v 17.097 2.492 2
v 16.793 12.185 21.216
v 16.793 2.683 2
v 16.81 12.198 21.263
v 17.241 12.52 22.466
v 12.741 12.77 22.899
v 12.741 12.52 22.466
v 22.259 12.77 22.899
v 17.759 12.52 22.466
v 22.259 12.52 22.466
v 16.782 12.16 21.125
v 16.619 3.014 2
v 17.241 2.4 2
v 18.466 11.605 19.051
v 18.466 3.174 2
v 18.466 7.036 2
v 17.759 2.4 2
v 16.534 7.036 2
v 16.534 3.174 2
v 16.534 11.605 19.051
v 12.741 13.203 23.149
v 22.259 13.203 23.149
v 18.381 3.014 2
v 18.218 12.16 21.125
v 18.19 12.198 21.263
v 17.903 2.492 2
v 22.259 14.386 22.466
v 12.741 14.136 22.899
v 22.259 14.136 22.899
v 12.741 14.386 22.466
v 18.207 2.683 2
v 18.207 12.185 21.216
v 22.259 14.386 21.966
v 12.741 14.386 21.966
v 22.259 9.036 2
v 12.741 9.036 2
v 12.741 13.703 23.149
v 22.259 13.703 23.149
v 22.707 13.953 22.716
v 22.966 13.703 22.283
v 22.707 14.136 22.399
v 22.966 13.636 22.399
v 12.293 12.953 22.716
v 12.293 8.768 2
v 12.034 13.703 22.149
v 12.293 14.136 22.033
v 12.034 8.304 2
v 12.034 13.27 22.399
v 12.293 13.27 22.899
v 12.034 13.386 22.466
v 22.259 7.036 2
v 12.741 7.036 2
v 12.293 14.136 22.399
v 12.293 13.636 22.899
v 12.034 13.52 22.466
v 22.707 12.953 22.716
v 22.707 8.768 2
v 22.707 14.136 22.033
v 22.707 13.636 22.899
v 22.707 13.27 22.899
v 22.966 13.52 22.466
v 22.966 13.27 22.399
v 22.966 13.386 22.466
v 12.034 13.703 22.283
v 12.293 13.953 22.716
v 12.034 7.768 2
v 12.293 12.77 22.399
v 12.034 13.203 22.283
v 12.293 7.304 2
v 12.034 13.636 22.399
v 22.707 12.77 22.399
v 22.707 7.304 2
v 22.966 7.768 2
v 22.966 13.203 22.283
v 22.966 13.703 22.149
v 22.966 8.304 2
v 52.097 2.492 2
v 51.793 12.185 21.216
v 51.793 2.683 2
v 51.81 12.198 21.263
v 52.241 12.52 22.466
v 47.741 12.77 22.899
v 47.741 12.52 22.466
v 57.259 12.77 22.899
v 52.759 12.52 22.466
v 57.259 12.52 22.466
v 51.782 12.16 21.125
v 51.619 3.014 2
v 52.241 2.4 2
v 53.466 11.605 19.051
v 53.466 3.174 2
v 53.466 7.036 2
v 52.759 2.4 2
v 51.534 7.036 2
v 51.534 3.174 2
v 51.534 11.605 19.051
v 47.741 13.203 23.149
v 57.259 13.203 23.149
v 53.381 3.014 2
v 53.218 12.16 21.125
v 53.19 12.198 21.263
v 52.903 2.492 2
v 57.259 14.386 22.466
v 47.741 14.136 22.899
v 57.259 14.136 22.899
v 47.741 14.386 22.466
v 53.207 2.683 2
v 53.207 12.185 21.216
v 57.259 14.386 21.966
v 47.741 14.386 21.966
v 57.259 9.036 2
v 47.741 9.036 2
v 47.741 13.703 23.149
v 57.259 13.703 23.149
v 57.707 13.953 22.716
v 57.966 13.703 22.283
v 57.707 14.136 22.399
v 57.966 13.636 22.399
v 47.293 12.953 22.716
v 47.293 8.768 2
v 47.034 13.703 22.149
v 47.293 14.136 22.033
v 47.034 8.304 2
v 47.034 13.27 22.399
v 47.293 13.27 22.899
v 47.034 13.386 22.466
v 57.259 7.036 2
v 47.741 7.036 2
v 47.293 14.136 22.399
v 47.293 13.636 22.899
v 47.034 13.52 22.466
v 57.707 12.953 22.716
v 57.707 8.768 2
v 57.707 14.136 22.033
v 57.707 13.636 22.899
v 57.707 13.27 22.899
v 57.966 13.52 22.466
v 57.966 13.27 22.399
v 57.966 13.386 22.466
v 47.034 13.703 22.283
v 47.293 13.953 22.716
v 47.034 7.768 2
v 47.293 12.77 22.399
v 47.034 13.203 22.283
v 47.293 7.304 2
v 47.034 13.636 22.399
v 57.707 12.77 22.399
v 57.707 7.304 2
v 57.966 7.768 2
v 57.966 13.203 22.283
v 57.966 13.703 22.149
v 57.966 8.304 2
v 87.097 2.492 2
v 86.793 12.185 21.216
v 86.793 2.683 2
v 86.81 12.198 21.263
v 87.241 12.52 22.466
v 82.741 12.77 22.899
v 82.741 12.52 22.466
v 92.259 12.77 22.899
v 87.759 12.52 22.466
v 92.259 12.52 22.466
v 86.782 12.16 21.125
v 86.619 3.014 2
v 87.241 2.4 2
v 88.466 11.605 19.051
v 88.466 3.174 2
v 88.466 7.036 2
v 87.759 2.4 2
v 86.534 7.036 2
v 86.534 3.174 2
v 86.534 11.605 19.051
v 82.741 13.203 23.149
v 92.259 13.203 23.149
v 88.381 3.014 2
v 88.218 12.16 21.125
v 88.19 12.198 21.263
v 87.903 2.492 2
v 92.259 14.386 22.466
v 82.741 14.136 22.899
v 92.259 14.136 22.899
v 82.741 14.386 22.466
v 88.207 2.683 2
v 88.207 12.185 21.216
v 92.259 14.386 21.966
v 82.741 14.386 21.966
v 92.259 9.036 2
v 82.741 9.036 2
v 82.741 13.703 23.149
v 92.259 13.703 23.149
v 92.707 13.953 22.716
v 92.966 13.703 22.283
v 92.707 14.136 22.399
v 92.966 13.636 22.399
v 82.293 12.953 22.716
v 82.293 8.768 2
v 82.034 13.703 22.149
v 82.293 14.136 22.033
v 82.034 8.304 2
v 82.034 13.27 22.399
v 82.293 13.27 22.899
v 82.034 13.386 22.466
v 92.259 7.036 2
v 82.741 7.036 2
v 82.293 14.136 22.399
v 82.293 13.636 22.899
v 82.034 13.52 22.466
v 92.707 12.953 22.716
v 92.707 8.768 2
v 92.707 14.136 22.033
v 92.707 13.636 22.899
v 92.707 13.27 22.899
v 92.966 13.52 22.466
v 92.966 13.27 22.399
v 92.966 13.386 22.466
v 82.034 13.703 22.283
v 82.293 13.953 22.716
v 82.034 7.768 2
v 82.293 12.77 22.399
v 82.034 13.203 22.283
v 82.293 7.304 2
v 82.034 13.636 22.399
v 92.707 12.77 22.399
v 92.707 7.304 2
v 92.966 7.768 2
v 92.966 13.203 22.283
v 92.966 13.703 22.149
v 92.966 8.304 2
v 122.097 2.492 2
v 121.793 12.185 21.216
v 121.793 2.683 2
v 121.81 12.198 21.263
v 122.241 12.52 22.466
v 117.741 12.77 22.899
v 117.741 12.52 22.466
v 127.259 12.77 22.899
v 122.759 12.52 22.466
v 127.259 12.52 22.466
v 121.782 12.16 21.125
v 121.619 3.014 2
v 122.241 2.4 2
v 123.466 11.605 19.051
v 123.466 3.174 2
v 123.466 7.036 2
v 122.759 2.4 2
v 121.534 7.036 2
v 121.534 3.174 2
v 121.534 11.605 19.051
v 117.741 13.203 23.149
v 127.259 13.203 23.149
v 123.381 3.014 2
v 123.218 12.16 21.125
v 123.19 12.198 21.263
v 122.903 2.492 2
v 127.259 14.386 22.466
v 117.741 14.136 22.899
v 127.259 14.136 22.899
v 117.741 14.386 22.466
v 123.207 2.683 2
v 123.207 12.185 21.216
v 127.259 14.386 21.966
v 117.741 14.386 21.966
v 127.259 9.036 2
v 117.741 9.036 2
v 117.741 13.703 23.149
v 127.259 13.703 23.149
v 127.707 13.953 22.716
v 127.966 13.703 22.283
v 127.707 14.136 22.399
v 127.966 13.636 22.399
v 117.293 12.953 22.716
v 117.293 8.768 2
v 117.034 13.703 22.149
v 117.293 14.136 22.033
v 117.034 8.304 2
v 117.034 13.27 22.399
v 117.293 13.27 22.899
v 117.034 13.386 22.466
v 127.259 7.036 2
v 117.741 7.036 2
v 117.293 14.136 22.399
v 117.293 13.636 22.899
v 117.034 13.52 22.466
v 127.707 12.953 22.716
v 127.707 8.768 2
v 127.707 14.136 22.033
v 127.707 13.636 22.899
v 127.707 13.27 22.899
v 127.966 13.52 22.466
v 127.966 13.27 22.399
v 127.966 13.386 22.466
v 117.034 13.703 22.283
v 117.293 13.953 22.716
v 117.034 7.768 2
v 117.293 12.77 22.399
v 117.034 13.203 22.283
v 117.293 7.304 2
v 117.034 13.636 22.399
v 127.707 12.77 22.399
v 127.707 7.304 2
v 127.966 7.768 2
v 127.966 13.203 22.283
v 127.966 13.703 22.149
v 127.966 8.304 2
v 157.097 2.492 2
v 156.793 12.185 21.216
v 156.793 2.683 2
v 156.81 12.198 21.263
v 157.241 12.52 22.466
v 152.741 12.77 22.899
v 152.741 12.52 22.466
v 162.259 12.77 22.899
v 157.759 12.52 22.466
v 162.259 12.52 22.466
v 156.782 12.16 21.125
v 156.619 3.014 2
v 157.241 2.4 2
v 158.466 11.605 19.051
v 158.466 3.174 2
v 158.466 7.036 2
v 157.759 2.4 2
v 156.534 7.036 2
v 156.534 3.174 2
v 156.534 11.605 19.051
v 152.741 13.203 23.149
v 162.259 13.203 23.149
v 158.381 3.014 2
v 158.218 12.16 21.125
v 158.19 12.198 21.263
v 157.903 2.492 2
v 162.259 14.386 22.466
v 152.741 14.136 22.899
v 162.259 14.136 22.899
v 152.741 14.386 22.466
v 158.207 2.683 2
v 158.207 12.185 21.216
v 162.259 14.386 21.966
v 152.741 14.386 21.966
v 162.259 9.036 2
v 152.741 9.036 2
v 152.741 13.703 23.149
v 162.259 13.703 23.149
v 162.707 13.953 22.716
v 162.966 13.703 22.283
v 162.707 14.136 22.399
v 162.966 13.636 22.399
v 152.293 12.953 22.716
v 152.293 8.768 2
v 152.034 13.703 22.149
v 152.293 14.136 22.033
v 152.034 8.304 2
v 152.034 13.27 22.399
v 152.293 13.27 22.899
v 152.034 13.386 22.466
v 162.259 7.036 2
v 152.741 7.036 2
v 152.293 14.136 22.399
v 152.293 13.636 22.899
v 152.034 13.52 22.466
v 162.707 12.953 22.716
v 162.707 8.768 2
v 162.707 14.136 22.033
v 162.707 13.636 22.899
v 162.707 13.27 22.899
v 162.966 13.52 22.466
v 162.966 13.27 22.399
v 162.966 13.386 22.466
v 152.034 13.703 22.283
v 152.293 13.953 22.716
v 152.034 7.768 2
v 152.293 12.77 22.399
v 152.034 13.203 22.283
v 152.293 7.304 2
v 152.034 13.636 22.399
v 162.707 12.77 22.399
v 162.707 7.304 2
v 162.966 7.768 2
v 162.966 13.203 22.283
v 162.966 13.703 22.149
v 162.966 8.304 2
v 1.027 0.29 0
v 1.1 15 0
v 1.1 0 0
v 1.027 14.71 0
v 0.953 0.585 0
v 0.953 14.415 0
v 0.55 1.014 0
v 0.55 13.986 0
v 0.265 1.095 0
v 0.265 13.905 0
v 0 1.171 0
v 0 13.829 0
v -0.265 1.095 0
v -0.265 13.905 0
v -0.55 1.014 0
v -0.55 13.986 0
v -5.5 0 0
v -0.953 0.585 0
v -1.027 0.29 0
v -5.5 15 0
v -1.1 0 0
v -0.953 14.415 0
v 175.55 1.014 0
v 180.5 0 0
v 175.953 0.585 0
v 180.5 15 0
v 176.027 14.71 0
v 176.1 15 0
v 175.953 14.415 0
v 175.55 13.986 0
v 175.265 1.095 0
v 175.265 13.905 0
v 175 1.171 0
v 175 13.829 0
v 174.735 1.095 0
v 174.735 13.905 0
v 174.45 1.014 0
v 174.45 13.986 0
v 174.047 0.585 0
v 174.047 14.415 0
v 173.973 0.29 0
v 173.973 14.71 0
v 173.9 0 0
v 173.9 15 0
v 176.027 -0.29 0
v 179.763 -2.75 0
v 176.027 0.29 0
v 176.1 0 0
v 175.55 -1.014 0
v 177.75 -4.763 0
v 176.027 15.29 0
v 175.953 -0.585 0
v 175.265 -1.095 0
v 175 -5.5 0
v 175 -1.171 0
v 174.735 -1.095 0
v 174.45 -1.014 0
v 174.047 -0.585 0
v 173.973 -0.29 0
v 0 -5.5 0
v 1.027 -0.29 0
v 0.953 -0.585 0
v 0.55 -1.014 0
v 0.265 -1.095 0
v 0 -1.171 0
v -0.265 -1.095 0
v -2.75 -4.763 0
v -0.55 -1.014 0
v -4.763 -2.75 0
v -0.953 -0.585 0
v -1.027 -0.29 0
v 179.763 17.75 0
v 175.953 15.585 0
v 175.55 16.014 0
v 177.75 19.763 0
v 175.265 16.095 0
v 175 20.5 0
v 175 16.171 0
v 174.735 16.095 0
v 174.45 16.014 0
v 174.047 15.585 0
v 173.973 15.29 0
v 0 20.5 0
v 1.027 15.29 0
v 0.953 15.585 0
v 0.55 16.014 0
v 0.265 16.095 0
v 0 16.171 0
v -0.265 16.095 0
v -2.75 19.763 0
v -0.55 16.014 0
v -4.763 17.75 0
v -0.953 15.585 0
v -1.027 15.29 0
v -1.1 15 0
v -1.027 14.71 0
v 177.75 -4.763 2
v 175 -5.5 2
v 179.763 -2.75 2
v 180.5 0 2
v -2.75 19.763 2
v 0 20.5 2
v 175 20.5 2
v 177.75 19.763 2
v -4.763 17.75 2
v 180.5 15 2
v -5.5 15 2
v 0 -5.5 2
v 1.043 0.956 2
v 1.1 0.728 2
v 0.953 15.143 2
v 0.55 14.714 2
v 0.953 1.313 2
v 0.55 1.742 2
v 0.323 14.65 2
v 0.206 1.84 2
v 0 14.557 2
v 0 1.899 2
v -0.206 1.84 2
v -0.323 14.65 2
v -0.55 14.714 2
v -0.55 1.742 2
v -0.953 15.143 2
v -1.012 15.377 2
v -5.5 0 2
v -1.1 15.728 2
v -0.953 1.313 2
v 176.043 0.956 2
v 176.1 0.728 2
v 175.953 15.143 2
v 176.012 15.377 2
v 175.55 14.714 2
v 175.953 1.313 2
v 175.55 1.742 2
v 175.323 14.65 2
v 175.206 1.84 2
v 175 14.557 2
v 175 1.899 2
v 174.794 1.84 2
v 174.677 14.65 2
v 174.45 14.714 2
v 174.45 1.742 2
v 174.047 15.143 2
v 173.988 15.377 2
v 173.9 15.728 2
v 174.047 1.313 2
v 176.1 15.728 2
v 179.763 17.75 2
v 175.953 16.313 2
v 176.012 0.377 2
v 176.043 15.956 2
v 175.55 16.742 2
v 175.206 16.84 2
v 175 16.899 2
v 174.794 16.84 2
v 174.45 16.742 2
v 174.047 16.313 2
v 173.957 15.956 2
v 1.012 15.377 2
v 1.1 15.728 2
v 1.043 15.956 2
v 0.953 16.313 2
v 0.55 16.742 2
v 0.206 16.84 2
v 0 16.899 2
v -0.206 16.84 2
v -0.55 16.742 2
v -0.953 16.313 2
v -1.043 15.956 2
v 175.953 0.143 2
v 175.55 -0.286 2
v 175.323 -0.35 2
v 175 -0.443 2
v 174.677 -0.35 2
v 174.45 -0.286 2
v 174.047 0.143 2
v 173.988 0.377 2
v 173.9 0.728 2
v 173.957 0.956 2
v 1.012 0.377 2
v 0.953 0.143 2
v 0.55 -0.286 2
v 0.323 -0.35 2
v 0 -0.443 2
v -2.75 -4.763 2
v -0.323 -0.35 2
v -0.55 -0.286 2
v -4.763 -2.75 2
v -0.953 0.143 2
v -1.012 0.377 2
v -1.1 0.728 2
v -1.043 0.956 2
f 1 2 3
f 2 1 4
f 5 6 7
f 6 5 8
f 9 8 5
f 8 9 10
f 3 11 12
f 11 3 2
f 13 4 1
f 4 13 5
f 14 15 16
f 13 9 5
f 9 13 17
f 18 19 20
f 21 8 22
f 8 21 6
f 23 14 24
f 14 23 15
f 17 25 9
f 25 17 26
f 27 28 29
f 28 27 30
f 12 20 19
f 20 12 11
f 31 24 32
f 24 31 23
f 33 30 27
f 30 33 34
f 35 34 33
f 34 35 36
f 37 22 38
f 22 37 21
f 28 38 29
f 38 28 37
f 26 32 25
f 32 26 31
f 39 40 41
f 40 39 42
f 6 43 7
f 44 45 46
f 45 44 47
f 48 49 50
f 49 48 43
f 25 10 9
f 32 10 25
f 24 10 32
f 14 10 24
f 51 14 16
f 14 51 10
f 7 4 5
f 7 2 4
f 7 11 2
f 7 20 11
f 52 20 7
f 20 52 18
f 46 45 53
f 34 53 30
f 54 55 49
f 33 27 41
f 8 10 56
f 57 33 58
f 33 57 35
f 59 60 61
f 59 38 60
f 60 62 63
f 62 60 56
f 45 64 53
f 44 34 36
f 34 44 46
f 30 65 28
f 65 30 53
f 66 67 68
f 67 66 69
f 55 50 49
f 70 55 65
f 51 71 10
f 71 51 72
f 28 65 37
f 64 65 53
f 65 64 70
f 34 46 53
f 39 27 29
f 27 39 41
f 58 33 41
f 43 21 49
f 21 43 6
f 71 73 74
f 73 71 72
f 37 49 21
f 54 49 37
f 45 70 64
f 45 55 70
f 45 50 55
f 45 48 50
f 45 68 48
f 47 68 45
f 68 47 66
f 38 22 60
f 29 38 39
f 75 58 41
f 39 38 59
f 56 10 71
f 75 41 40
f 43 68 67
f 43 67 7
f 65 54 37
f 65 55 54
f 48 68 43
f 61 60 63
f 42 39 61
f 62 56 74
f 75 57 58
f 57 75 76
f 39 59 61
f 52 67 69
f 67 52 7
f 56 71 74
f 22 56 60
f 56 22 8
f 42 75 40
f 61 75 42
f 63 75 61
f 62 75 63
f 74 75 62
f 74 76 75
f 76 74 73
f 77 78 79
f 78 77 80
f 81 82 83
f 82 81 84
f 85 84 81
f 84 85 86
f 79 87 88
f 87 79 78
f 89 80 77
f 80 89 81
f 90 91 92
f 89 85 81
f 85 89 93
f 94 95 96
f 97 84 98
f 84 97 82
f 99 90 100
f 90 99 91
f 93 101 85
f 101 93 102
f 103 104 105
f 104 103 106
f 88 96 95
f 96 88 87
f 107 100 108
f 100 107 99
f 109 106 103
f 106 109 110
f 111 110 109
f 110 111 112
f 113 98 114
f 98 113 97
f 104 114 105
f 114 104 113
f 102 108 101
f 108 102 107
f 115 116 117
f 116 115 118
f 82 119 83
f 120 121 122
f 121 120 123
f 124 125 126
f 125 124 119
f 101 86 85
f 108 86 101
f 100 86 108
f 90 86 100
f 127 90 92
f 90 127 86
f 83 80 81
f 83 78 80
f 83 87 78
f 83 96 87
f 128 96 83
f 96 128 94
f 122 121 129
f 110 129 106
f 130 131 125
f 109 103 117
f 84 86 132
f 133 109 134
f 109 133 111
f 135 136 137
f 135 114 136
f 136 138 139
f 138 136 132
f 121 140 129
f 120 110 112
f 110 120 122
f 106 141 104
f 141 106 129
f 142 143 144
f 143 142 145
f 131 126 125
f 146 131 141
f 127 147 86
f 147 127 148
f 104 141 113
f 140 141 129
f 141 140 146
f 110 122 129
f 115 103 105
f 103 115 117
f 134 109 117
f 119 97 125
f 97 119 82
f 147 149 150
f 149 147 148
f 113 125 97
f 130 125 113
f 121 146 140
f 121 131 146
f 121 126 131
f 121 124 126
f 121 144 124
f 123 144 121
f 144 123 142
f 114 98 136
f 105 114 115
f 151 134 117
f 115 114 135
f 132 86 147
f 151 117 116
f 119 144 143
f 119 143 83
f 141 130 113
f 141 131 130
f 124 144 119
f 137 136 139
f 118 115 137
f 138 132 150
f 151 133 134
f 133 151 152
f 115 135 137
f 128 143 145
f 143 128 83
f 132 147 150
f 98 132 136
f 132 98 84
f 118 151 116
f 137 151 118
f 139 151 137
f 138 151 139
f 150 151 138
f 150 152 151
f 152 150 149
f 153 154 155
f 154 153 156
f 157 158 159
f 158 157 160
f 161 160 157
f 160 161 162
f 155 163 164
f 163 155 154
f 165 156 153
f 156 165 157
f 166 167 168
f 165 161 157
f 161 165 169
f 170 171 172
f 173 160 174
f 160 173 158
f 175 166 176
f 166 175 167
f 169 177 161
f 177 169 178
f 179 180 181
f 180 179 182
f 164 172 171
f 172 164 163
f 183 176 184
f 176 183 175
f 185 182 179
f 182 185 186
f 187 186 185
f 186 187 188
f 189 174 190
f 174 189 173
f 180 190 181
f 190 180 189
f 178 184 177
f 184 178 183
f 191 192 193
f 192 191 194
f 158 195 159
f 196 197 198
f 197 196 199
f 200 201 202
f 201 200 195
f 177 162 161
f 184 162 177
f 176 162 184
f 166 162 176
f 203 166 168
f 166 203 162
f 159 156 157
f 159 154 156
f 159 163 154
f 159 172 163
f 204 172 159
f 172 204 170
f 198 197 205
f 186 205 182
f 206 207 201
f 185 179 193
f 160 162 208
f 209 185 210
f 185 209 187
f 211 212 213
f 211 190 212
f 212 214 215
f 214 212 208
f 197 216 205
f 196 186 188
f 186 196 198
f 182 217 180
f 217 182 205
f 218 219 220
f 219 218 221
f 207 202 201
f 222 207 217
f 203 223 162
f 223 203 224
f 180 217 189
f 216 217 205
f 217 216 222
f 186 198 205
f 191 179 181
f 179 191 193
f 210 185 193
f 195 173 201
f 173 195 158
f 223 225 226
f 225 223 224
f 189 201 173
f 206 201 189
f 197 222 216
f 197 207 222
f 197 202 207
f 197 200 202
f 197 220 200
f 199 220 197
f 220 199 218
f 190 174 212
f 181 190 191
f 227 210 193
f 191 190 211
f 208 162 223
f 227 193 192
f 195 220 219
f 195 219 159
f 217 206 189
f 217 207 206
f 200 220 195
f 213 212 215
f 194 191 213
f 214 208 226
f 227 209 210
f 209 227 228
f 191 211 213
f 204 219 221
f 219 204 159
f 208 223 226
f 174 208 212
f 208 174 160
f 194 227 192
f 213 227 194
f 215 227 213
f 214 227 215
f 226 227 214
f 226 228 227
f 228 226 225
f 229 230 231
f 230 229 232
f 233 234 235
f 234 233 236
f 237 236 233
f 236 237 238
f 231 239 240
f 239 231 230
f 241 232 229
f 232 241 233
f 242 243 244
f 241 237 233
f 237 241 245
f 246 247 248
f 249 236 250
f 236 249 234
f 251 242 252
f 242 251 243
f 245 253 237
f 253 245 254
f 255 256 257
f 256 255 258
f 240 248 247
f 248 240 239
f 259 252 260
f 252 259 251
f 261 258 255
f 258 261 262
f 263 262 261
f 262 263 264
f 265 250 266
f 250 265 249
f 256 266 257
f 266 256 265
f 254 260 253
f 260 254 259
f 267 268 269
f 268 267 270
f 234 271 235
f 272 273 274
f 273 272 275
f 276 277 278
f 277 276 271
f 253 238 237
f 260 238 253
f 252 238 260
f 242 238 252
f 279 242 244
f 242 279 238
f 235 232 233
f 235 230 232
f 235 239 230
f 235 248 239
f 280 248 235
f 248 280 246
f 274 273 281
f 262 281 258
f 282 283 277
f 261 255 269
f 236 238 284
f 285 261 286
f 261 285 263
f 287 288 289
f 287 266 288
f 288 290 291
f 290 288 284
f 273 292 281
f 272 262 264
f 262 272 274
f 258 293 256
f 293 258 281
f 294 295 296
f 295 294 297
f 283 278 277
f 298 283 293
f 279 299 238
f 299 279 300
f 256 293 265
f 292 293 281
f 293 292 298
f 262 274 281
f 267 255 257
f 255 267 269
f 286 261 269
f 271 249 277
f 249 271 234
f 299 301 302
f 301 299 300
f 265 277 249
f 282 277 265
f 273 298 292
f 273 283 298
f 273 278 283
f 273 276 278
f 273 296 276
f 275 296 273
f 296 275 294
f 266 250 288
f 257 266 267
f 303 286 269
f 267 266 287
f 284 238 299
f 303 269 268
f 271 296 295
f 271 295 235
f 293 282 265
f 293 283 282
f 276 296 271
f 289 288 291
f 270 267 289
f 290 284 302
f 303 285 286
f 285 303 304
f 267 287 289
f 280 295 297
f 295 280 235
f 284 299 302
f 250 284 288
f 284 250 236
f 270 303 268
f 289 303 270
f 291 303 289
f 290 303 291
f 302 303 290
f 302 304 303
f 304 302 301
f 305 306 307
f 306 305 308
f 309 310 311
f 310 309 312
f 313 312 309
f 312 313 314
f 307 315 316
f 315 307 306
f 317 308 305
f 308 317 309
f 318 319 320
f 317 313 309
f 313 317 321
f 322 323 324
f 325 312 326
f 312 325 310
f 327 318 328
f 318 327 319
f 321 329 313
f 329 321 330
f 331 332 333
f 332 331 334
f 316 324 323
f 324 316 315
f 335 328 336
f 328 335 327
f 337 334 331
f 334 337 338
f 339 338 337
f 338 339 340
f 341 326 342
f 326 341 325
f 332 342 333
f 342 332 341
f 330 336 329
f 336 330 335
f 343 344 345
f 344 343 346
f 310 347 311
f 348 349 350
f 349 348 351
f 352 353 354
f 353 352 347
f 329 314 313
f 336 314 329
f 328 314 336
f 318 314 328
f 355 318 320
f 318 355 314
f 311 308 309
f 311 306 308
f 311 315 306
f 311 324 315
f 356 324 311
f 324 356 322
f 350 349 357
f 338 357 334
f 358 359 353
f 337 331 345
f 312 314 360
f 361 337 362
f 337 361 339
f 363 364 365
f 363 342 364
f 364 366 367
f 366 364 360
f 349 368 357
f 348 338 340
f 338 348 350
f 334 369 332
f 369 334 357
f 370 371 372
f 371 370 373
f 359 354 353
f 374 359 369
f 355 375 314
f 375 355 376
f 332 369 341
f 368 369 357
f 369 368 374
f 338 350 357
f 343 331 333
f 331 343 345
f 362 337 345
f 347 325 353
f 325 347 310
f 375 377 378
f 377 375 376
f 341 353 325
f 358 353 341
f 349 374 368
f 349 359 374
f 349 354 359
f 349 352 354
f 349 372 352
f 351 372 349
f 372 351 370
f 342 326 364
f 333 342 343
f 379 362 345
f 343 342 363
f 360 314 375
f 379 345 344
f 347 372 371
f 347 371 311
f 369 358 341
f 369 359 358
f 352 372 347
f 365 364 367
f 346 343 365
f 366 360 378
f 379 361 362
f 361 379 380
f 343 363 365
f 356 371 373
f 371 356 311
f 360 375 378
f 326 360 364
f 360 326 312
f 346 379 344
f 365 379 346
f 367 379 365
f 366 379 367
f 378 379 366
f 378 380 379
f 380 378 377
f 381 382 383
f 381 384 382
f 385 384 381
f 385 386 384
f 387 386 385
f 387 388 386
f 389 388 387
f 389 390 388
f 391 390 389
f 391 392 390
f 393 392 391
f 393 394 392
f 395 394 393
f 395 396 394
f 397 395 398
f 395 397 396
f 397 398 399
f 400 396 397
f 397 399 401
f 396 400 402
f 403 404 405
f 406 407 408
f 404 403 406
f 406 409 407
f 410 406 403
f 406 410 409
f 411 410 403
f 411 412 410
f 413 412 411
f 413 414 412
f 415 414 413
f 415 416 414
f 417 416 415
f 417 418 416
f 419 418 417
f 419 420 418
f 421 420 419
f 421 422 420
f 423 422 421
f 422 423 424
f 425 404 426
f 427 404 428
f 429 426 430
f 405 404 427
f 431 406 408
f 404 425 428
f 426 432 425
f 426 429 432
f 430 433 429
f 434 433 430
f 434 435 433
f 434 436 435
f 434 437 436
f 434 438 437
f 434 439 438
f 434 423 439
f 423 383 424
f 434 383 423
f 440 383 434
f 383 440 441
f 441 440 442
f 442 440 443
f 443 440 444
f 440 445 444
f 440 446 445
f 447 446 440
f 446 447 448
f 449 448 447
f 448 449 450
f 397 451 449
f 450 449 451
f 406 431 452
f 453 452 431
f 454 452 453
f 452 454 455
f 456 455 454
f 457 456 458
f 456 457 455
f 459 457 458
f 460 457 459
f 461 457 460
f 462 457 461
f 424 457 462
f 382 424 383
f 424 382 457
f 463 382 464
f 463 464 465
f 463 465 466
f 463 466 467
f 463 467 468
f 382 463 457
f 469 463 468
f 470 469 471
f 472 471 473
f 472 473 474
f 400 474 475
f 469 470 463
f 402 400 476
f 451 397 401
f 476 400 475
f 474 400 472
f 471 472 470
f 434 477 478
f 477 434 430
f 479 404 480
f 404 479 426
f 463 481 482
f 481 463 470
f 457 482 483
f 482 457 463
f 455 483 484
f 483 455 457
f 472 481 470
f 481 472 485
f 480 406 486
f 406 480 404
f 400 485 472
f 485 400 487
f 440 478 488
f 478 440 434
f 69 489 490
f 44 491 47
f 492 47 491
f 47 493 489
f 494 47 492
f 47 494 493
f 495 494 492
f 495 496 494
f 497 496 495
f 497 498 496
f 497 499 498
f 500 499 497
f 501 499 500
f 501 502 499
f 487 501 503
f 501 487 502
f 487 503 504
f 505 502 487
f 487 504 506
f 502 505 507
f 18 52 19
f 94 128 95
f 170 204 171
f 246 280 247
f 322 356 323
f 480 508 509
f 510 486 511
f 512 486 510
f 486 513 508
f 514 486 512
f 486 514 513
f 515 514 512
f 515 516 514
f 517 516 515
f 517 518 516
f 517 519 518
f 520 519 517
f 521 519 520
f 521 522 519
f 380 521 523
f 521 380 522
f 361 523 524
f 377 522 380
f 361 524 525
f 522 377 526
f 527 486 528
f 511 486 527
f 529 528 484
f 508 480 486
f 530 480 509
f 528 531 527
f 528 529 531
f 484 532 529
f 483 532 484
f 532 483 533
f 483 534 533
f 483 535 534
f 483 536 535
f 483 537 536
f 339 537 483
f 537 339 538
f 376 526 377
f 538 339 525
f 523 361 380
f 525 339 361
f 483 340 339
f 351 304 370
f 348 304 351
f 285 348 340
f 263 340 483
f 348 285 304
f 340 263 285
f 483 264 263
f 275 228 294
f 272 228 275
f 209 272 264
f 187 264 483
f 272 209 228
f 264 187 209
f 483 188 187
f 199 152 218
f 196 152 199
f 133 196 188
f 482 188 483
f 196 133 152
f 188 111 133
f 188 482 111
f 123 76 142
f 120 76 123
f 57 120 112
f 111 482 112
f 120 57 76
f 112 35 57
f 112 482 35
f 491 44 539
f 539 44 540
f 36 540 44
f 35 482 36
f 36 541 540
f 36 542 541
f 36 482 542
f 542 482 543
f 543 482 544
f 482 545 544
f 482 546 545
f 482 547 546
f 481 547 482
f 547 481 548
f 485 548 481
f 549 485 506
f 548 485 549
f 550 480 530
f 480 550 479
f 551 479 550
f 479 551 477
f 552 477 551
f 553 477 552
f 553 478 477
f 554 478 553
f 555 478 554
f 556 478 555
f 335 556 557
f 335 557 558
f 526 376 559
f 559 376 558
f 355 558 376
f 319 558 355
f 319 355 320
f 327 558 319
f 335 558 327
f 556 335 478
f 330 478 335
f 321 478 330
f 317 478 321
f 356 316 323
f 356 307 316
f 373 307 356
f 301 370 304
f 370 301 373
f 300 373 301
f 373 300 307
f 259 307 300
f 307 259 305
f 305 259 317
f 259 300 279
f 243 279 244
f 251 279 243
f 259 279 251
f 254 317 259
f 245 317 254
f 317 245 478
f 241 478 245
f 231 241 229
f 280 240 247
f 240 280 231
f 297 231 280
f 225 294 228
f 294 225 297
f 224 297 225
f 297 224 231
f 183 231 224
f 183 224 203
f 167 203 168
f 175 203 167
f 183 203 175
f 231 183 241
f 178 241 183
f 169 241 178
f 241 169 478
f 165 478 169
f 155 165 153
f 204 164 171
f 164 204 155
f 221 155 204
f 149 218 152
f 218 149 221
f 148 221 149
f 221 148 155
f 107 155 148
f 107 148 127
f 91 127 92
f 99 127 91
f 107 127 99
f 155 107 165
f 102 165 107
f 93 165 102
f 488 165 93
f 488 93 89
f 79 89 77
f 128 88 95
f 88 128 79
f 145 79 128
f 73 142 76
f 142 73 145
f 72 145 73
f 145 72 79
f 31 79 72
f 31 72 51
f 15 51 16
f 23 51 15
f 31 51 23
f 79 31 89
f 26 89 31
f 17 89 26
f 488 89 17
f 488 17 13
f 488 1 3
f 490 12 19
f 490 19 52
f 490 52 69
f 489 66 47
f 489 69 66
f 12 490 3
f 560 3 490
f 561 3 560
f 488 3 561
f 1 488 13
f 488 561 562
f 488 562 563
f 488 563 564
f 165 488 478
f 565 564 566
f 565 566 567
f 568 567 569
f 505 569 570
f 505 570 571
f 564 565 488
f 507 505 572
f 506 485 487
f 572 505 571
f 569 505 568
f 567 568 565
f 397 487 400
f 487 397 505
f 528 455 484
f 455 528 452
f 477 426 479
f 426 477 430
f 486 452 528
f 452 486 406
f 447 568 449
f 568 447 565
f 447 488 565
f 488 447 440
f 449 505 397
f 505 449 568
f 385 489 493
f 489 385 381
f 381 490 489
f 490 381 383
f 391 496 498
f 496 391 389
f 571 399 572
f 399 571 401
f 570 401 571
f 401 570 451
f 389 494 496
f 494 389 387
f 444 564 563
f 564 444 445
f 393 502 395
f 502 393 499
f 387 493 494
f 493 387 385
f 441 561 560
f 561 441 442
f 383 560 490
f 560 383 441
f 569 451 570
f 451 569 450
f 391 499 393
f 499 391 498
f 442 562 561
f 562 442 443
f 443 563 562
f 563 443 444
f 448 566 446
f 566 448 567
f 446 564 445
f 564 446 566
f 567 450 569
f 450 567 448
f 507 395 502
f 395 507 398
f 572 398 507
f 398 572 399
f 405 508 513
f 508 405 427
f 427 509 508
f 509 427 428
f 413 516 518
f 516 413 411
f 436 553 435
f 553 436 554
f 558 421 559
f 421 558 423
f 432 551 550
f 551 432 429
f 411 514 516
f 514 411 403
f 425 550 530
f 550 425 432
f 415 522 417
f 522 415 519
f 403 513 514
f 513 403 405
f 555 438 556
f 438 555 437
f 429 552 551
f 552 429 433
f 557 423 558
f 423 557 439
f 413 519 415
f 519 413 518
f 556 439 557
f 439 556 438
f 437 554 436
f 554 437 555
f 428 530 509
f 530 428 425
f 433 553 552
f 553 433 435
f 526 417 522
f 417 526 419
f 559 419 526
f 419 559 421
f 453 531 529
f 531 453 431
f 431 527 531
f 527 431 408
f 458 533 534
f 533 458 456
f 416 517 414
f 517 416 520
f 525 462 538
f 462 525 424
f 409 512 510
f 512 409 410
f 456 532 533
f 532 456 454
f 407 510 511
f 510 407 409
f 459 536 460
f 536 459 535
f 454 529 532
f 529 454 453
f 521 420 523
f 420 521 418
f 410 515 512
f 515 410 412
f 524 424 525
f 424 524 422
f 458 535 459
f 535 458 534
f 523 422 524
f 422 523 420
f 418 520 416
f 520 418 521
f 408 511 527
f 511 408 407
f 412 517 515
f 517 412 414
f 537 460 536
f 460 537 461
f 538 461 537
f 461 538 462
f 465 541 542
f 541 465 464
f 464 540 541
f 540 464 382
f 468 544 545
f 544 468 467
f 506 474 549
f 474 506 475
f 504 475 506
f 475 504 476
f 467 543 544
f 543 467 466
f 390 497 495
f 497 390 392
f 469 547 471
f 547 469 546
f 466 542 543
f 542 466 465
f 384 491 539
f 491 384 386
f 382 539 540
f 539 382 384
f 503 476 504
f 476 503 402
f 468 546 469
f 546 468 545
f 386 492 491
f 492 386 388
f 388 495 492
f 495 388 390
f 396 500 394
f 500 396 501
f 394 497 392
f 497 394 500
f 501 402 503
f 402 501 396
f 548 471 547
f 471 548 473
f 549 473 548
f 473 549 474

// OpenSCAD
numberOfHooks = 5;
height = 15;
hookWidth = 11;
thickness = 2;
hookLength = 22;
hookAngle = 75;
supportRatio = 0.6;
nailHoleDiameter = 2.2;
nailHoleAngle = 70;
numberOfHooks = 5;
spacing = 35;

module dummy() {}

$fn = 12;

nudge = 0.01;

points = [for (i=[0:numberOfHooks-1]) [spacing*0.5+spacing*i,height/2]];

module base(h=thickness) 
{
    linear_extrude(height=h)
    offset(r=hookWidth/2)
    square([spacing*numberOfHooks,height]);
}

module hook()
{
    rotate([0,0,180])
    rotate([90-hookAngle,0,0])
    translate([-hookWidth/2,0,thickness/2]) 
    rotate([0,0,180])
    rotate([0,-90,0]) {    
        hull() {
            translate([-hookWidth,-hookWidth*supportRatio,hookWidth/2])
            sphere(d=thickness);
            translate([hookLength,0,hookWidth/2]) sphere(d=thickness);
            translate([0,0,hookWidth/2]) sphere(d=thickness);
        }
        
        hull() {
            translate([0,0,thickness/2]) sphere(d=thickness);
            translate([0,0,hookWidth-thickness/2]) sphere(d=thickness);
            translate([hookLength,0,thickness/2]) sphere(d=thickness);
            translate([hookLength,0,hookWidth-thickness/2]) sphere(d=thickness);
        }
    }
}

module hooks() {
    render(convexity=2)
    intersection() {
        union() {
            for (i=[0:numberOfHooks-1]) translate(points[i]) hook();
        }
        base(h=hookLength+hookWidth);
    }
}

module nailHole() {
    rotate([nailHoleAngle-90,0,0])
    translate([0,0,-thickness*5]) cylinder(h=thickness*10,d=nailHoleDiameter);
}

hooks();
render(convexity=4)
difference() {
    base();
    translate([0,0]) nailHole();
    translate([spacing*numberOfHooks,0]) nailHole();
    translate([spacing*numberOfHooks,height]) nailHole();
    translate([0,height]) nailHole();
}
